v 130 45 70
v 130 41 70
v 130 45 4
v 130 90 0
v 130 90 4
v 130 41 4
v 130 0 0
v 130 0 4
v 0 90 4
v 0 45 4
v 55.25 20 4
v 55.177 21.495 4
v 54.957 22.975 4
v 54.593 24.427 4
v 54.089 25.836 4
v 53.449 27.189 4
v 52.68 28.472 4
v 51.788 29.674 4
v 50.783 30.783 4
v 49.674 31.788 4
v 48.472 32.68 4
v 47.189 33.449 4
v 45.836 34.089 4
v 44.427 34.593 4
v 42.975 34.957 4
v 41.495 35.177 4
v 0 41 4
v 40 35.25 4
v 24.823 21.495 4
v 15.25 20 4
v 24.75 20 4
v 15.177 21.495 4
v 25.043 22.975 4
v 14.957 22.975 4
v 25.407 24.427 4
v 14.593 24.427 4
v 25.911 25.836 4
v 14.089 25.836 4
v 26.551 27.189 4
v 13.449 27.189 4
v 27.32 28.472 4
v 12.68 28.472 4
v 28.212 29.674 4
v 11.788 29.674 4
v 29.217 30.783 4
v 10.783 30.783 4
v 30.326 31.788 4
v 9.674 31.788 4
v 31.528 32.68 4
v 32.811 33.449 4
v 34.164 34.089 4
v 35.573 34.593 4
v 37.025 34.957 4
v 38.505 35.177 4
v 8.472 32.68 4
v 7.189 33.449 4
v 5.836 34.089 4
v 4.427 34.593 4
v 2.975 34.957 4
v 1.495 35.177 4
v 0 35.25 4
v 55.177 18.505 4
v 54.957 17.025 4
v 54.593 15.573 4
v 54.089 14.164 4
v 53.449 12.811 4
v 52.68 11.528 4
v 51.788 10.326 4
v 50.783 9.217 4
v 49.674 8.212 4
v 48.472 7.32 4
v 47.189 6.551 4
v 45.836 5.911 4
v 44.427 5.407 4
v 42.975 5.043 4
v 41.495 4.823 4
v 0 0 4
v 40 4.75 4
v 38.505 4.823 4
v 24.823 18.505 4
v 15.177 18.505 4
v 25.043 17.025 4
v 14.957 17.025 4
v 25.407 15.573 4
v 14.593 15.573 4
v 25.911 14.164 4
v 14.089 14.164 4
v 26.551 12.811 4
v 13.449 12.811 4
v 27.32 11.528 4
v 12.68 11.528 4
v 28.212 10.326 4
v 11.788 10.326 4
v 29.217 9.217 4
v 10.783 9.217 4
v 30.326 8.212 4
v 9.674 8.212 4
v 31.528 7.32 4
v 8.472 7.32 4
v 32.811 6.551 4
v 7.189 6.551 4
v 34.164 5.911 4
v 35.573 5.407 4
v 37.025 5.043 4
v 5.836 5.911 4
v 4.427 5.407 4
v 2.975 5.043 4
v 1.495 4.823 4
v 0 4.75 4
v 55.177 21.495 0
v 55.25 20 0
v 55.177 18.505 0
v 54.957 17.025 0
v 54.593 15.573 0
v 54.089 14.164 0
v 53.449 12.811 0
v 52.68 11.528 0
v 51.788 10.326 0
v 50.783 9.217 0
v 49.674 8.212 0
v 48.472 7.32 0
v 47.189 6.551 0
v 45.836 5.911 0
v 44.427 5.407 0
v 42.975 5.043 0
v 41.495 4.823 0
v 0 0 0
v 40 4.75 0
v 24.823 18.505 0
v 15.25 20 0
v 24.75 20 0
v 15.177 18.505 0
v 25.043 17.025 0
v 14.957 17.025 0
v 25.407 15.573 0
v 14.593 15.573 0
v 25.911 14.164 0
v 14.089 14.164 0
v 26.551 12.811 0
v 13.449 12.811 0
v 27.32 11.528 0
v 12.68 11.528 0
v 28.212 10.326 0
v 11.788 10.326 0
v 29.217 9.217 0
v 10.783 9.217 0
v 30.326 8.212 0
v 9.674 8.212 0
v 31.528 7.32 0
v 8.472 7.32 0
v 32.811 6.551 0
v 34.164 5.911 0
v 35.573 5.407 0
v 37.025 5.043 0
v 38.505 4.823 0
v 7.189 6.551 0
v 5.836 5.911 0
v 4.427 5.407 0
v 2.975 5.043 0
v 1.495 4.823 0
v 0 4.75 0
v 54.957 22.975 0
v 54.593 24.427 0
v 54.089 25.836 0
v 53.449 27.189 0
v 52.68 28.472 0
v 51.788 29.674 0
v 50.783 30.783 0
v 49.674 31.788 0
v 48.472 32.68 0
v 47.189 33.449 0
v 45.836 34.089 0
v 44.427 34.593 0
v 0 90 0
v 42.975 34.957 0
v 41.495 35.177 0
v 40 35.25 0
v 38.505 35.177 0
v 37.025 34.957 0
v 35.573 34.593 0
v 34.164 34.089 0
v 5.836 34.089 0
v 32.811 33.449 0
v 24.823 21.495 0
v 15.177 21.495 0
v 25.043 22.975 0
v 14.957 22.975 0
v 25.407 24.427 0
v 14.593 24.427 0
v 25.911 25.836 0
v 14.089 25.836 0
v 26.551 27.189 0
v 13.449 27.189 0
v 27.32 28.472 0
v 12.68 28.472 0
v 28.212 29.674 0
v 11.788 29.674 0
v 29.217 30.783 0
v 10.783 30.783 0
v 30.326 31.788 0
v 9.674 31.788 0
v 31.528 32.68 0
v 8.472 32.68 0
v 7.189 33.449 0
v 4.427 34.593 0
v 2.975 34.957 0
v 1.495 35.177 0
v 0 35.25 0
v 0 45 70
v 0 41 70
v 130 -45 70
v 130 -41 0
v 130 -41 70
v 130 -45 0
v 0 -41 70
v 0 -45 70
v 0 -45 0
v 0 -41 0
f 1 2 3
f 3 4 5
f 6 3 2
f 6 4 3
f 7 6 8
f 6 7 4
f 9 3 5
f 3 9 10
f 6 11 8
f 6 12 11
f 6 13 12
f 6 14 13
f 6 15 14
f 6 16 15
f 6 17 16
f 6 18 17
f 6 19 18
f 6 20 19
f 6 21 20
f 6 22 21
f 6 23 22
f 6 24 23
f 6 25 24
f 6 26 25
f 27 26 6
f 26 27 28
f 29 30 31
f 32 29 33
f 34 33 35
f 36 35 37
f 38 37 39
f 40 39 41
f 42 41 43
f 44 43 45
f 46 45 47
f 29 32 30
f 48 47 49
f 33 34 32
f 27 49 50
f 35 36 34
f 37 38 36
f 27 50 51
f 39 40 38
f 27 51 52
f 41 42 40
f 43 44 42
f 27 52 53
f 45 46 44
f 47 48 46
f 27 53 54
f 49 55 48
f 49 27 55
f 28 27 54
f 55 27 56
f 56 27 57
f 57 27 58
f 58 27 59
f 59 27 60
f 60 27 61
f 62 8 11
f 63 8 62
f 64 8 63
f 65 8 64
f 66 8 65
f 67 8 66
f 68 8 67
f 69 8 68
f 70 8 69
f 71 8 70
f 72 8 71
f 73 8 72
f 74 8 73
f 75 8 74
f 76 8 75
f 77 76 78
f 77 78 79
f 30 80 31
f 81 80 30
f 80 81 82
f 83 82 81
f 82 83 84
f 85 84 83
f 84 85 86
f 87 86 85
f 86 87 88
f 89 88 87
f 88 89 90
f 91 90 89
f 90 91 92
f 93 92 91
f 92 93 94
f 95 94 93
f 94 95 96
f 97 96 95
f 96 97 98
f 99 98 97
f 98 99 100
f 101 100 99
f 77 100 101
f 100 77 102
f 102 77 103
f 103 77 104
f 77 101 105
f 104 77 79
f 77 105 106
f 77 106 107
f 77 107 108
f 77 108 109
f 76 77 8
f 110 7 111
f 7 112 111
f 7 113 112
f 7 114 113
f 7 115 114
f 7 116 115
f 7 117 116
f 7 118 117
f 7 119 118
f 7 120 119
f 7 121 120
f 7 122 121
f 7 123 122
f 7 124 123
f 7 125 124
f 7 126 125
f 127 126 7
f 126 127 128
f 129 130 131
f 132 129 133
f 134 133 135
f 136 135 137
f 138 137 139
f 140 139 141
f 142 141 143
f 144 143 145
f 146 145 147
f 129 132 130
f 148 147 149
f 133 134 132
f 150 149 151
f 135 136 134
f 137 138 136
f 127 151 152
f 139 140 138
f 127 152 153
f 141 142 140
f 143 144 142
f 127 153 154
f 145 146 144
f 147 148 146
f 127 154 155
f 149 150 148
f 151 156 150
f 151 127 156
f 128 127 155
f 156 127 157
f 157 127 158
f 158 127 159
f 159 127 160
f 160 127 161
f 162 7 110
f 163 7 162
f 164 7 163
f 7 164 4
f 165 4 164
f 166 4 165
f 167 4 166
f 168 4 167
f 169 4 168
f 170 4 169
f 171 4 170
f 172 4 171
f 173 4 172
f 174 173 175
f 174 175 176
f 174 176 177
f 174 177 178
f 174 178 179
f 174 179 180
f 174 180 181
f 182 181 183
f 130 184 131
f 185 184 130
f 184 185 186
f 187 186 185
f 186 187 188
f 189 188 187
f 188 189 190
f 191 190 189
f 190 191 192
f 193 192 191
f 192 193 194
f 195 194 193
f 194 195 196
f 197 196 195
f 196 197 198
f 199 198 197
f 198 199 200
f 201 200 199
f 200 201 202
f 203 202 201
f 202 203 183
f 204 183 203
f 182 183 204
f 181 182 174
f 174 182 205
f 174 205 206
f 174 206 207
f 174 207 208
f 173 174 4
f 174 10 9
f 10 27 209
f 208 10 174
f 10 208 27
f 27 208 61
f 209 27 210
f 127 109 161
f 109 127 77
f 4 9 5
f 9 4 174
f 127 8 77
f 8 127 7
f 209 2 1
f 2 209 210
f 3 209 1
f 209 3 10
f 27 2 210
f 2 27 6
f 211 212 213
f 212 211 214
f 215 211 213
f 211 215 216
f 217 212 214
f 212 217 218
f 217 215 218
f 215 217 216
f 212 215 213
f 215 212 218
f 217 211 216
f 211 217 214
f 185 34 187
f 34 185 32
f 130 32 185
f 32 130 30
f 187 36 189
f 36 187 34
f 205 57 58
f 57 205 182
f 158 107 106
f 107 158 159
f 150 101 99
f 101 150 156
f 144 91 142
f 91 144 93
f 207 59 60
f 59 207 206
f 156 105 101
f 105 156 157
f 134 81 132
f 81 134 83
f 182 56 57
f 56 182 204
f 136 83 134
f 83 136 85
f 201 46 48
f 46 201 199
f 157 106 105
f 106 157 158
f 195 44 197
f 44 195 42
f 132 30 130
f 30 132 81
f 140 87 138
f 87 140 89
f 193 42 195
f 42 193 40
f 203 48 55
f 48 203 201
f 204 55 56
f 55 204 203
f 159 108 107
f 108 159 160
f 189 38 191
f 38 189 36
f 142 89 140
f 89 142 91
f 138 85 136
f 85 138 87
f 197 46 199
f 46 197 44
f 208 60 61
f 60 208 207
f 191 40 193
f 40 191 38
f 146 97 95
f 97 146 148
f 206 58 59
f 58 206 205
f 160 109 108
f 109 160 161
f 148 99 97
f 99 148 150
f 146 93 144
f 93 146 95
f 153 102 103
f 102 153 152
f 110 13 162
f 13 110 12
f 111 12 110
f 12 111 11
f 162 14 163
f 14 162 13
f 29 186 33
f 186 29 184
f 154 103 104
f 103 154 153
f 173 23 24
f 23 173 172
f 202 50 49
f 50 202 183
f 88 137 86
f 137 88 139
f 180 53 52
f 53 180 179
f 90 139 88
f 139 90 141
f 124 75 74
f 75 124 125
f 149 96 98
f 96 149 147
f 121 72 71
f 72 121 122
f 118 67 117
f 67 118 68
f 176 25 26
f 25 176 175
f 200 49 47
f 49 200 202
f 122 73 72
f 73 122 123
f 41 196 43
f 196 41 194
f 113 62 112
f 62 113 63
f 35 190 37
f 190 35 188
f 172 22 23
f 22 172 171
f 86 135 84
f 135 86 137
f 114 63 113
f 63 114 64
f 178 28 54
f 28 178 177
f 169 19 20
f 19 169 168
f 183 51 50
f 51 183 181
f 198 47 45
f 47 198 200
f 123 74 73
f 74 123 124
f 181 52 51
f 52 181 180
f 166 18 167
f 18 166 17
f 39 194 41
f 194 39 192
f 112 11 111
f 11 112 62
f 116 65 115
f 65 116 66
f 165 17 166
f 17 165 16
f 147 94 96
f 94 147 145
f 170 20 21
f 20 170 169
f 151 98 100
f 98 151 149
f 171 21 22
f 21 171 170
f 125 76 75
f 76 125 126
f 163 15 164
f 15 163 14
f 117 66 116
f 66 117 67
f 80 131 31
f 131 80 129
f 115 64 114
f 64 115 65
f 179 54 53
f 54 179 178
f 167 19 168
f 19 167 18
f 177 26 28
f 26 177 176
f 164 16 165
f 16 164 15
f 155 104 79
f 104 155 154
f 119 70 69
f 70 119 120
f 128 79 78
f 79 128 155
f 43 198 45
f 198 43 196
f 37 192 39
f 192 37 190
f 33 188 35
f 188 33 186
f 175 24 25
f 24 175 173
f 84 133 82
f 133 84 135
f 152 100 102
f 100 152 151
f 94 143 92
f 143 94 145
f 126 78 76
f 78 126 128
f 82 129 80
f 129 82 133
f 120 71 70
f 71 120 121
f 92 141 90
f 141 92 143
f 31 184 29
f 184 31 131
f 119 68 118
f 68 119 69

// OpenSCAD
// Rack for six 50 mL conical (Falcon-type) tubes
// Print orientation: flat plate on bed (z=0), walls rise up. Flipped after print.

// Plate dimensions
plate_x = 130;
plate_y = 90;
plate_z = 4;

// Hole parameters
hole_diameter = 30.5;
hole_radius = hole_diameter / 2;
hole_spacing_x = 40;
hole_spacing_y = 40;
num_rows = 2; // along Y
num_cols = 3; // along X

// Wall parameters
wall_length_x = 130;
wall_thickness_y = 4;
wall_height = 70;

// Ensure round holes
$fn = 64;

// Calculate hole positions (centred on plate)
// X positions: centred, spacing 40mm
x_positions = [
    -hole_spacing_x,
    0,
    hole_spacing_x
];

// Y positions: centred, spacing 40mm
y_positions = [
    -hole_spacing_y / 2,
    hole_spacing_y / 2
];

// Build the rack as a single solid
difference() {
    union() {
        // Flat plate (centred on origin)
        translate([0, 0, 0])
            cube([plate_x, plate_y, plate_z], center = false);
        
        // Two walls along long edges (X-direction), flush with plate edges
        // Front wall (positive Y edge)
        translate([0, plate_y / 2 - wall_thickness_y, 0])
            cube([wall_length_x, wall_thickness_y, wall_height], center = false);
        
        // Back wall (negative Y edge)
        translate([0, -plate_y / 2, 0])
            cube([wall_length_x, wall_thickness_y, wall_height], center = false);
    }
    
    // Cut through-holes for tubes (extend slightly past plate faces)
    for (x = x_positions) {
        for (y = y_positions) {
            translate([x, y, -0.01])
                cylinder(r = hole_radius, h = plate_z + 0.02, center = false);
        }
    }
}
